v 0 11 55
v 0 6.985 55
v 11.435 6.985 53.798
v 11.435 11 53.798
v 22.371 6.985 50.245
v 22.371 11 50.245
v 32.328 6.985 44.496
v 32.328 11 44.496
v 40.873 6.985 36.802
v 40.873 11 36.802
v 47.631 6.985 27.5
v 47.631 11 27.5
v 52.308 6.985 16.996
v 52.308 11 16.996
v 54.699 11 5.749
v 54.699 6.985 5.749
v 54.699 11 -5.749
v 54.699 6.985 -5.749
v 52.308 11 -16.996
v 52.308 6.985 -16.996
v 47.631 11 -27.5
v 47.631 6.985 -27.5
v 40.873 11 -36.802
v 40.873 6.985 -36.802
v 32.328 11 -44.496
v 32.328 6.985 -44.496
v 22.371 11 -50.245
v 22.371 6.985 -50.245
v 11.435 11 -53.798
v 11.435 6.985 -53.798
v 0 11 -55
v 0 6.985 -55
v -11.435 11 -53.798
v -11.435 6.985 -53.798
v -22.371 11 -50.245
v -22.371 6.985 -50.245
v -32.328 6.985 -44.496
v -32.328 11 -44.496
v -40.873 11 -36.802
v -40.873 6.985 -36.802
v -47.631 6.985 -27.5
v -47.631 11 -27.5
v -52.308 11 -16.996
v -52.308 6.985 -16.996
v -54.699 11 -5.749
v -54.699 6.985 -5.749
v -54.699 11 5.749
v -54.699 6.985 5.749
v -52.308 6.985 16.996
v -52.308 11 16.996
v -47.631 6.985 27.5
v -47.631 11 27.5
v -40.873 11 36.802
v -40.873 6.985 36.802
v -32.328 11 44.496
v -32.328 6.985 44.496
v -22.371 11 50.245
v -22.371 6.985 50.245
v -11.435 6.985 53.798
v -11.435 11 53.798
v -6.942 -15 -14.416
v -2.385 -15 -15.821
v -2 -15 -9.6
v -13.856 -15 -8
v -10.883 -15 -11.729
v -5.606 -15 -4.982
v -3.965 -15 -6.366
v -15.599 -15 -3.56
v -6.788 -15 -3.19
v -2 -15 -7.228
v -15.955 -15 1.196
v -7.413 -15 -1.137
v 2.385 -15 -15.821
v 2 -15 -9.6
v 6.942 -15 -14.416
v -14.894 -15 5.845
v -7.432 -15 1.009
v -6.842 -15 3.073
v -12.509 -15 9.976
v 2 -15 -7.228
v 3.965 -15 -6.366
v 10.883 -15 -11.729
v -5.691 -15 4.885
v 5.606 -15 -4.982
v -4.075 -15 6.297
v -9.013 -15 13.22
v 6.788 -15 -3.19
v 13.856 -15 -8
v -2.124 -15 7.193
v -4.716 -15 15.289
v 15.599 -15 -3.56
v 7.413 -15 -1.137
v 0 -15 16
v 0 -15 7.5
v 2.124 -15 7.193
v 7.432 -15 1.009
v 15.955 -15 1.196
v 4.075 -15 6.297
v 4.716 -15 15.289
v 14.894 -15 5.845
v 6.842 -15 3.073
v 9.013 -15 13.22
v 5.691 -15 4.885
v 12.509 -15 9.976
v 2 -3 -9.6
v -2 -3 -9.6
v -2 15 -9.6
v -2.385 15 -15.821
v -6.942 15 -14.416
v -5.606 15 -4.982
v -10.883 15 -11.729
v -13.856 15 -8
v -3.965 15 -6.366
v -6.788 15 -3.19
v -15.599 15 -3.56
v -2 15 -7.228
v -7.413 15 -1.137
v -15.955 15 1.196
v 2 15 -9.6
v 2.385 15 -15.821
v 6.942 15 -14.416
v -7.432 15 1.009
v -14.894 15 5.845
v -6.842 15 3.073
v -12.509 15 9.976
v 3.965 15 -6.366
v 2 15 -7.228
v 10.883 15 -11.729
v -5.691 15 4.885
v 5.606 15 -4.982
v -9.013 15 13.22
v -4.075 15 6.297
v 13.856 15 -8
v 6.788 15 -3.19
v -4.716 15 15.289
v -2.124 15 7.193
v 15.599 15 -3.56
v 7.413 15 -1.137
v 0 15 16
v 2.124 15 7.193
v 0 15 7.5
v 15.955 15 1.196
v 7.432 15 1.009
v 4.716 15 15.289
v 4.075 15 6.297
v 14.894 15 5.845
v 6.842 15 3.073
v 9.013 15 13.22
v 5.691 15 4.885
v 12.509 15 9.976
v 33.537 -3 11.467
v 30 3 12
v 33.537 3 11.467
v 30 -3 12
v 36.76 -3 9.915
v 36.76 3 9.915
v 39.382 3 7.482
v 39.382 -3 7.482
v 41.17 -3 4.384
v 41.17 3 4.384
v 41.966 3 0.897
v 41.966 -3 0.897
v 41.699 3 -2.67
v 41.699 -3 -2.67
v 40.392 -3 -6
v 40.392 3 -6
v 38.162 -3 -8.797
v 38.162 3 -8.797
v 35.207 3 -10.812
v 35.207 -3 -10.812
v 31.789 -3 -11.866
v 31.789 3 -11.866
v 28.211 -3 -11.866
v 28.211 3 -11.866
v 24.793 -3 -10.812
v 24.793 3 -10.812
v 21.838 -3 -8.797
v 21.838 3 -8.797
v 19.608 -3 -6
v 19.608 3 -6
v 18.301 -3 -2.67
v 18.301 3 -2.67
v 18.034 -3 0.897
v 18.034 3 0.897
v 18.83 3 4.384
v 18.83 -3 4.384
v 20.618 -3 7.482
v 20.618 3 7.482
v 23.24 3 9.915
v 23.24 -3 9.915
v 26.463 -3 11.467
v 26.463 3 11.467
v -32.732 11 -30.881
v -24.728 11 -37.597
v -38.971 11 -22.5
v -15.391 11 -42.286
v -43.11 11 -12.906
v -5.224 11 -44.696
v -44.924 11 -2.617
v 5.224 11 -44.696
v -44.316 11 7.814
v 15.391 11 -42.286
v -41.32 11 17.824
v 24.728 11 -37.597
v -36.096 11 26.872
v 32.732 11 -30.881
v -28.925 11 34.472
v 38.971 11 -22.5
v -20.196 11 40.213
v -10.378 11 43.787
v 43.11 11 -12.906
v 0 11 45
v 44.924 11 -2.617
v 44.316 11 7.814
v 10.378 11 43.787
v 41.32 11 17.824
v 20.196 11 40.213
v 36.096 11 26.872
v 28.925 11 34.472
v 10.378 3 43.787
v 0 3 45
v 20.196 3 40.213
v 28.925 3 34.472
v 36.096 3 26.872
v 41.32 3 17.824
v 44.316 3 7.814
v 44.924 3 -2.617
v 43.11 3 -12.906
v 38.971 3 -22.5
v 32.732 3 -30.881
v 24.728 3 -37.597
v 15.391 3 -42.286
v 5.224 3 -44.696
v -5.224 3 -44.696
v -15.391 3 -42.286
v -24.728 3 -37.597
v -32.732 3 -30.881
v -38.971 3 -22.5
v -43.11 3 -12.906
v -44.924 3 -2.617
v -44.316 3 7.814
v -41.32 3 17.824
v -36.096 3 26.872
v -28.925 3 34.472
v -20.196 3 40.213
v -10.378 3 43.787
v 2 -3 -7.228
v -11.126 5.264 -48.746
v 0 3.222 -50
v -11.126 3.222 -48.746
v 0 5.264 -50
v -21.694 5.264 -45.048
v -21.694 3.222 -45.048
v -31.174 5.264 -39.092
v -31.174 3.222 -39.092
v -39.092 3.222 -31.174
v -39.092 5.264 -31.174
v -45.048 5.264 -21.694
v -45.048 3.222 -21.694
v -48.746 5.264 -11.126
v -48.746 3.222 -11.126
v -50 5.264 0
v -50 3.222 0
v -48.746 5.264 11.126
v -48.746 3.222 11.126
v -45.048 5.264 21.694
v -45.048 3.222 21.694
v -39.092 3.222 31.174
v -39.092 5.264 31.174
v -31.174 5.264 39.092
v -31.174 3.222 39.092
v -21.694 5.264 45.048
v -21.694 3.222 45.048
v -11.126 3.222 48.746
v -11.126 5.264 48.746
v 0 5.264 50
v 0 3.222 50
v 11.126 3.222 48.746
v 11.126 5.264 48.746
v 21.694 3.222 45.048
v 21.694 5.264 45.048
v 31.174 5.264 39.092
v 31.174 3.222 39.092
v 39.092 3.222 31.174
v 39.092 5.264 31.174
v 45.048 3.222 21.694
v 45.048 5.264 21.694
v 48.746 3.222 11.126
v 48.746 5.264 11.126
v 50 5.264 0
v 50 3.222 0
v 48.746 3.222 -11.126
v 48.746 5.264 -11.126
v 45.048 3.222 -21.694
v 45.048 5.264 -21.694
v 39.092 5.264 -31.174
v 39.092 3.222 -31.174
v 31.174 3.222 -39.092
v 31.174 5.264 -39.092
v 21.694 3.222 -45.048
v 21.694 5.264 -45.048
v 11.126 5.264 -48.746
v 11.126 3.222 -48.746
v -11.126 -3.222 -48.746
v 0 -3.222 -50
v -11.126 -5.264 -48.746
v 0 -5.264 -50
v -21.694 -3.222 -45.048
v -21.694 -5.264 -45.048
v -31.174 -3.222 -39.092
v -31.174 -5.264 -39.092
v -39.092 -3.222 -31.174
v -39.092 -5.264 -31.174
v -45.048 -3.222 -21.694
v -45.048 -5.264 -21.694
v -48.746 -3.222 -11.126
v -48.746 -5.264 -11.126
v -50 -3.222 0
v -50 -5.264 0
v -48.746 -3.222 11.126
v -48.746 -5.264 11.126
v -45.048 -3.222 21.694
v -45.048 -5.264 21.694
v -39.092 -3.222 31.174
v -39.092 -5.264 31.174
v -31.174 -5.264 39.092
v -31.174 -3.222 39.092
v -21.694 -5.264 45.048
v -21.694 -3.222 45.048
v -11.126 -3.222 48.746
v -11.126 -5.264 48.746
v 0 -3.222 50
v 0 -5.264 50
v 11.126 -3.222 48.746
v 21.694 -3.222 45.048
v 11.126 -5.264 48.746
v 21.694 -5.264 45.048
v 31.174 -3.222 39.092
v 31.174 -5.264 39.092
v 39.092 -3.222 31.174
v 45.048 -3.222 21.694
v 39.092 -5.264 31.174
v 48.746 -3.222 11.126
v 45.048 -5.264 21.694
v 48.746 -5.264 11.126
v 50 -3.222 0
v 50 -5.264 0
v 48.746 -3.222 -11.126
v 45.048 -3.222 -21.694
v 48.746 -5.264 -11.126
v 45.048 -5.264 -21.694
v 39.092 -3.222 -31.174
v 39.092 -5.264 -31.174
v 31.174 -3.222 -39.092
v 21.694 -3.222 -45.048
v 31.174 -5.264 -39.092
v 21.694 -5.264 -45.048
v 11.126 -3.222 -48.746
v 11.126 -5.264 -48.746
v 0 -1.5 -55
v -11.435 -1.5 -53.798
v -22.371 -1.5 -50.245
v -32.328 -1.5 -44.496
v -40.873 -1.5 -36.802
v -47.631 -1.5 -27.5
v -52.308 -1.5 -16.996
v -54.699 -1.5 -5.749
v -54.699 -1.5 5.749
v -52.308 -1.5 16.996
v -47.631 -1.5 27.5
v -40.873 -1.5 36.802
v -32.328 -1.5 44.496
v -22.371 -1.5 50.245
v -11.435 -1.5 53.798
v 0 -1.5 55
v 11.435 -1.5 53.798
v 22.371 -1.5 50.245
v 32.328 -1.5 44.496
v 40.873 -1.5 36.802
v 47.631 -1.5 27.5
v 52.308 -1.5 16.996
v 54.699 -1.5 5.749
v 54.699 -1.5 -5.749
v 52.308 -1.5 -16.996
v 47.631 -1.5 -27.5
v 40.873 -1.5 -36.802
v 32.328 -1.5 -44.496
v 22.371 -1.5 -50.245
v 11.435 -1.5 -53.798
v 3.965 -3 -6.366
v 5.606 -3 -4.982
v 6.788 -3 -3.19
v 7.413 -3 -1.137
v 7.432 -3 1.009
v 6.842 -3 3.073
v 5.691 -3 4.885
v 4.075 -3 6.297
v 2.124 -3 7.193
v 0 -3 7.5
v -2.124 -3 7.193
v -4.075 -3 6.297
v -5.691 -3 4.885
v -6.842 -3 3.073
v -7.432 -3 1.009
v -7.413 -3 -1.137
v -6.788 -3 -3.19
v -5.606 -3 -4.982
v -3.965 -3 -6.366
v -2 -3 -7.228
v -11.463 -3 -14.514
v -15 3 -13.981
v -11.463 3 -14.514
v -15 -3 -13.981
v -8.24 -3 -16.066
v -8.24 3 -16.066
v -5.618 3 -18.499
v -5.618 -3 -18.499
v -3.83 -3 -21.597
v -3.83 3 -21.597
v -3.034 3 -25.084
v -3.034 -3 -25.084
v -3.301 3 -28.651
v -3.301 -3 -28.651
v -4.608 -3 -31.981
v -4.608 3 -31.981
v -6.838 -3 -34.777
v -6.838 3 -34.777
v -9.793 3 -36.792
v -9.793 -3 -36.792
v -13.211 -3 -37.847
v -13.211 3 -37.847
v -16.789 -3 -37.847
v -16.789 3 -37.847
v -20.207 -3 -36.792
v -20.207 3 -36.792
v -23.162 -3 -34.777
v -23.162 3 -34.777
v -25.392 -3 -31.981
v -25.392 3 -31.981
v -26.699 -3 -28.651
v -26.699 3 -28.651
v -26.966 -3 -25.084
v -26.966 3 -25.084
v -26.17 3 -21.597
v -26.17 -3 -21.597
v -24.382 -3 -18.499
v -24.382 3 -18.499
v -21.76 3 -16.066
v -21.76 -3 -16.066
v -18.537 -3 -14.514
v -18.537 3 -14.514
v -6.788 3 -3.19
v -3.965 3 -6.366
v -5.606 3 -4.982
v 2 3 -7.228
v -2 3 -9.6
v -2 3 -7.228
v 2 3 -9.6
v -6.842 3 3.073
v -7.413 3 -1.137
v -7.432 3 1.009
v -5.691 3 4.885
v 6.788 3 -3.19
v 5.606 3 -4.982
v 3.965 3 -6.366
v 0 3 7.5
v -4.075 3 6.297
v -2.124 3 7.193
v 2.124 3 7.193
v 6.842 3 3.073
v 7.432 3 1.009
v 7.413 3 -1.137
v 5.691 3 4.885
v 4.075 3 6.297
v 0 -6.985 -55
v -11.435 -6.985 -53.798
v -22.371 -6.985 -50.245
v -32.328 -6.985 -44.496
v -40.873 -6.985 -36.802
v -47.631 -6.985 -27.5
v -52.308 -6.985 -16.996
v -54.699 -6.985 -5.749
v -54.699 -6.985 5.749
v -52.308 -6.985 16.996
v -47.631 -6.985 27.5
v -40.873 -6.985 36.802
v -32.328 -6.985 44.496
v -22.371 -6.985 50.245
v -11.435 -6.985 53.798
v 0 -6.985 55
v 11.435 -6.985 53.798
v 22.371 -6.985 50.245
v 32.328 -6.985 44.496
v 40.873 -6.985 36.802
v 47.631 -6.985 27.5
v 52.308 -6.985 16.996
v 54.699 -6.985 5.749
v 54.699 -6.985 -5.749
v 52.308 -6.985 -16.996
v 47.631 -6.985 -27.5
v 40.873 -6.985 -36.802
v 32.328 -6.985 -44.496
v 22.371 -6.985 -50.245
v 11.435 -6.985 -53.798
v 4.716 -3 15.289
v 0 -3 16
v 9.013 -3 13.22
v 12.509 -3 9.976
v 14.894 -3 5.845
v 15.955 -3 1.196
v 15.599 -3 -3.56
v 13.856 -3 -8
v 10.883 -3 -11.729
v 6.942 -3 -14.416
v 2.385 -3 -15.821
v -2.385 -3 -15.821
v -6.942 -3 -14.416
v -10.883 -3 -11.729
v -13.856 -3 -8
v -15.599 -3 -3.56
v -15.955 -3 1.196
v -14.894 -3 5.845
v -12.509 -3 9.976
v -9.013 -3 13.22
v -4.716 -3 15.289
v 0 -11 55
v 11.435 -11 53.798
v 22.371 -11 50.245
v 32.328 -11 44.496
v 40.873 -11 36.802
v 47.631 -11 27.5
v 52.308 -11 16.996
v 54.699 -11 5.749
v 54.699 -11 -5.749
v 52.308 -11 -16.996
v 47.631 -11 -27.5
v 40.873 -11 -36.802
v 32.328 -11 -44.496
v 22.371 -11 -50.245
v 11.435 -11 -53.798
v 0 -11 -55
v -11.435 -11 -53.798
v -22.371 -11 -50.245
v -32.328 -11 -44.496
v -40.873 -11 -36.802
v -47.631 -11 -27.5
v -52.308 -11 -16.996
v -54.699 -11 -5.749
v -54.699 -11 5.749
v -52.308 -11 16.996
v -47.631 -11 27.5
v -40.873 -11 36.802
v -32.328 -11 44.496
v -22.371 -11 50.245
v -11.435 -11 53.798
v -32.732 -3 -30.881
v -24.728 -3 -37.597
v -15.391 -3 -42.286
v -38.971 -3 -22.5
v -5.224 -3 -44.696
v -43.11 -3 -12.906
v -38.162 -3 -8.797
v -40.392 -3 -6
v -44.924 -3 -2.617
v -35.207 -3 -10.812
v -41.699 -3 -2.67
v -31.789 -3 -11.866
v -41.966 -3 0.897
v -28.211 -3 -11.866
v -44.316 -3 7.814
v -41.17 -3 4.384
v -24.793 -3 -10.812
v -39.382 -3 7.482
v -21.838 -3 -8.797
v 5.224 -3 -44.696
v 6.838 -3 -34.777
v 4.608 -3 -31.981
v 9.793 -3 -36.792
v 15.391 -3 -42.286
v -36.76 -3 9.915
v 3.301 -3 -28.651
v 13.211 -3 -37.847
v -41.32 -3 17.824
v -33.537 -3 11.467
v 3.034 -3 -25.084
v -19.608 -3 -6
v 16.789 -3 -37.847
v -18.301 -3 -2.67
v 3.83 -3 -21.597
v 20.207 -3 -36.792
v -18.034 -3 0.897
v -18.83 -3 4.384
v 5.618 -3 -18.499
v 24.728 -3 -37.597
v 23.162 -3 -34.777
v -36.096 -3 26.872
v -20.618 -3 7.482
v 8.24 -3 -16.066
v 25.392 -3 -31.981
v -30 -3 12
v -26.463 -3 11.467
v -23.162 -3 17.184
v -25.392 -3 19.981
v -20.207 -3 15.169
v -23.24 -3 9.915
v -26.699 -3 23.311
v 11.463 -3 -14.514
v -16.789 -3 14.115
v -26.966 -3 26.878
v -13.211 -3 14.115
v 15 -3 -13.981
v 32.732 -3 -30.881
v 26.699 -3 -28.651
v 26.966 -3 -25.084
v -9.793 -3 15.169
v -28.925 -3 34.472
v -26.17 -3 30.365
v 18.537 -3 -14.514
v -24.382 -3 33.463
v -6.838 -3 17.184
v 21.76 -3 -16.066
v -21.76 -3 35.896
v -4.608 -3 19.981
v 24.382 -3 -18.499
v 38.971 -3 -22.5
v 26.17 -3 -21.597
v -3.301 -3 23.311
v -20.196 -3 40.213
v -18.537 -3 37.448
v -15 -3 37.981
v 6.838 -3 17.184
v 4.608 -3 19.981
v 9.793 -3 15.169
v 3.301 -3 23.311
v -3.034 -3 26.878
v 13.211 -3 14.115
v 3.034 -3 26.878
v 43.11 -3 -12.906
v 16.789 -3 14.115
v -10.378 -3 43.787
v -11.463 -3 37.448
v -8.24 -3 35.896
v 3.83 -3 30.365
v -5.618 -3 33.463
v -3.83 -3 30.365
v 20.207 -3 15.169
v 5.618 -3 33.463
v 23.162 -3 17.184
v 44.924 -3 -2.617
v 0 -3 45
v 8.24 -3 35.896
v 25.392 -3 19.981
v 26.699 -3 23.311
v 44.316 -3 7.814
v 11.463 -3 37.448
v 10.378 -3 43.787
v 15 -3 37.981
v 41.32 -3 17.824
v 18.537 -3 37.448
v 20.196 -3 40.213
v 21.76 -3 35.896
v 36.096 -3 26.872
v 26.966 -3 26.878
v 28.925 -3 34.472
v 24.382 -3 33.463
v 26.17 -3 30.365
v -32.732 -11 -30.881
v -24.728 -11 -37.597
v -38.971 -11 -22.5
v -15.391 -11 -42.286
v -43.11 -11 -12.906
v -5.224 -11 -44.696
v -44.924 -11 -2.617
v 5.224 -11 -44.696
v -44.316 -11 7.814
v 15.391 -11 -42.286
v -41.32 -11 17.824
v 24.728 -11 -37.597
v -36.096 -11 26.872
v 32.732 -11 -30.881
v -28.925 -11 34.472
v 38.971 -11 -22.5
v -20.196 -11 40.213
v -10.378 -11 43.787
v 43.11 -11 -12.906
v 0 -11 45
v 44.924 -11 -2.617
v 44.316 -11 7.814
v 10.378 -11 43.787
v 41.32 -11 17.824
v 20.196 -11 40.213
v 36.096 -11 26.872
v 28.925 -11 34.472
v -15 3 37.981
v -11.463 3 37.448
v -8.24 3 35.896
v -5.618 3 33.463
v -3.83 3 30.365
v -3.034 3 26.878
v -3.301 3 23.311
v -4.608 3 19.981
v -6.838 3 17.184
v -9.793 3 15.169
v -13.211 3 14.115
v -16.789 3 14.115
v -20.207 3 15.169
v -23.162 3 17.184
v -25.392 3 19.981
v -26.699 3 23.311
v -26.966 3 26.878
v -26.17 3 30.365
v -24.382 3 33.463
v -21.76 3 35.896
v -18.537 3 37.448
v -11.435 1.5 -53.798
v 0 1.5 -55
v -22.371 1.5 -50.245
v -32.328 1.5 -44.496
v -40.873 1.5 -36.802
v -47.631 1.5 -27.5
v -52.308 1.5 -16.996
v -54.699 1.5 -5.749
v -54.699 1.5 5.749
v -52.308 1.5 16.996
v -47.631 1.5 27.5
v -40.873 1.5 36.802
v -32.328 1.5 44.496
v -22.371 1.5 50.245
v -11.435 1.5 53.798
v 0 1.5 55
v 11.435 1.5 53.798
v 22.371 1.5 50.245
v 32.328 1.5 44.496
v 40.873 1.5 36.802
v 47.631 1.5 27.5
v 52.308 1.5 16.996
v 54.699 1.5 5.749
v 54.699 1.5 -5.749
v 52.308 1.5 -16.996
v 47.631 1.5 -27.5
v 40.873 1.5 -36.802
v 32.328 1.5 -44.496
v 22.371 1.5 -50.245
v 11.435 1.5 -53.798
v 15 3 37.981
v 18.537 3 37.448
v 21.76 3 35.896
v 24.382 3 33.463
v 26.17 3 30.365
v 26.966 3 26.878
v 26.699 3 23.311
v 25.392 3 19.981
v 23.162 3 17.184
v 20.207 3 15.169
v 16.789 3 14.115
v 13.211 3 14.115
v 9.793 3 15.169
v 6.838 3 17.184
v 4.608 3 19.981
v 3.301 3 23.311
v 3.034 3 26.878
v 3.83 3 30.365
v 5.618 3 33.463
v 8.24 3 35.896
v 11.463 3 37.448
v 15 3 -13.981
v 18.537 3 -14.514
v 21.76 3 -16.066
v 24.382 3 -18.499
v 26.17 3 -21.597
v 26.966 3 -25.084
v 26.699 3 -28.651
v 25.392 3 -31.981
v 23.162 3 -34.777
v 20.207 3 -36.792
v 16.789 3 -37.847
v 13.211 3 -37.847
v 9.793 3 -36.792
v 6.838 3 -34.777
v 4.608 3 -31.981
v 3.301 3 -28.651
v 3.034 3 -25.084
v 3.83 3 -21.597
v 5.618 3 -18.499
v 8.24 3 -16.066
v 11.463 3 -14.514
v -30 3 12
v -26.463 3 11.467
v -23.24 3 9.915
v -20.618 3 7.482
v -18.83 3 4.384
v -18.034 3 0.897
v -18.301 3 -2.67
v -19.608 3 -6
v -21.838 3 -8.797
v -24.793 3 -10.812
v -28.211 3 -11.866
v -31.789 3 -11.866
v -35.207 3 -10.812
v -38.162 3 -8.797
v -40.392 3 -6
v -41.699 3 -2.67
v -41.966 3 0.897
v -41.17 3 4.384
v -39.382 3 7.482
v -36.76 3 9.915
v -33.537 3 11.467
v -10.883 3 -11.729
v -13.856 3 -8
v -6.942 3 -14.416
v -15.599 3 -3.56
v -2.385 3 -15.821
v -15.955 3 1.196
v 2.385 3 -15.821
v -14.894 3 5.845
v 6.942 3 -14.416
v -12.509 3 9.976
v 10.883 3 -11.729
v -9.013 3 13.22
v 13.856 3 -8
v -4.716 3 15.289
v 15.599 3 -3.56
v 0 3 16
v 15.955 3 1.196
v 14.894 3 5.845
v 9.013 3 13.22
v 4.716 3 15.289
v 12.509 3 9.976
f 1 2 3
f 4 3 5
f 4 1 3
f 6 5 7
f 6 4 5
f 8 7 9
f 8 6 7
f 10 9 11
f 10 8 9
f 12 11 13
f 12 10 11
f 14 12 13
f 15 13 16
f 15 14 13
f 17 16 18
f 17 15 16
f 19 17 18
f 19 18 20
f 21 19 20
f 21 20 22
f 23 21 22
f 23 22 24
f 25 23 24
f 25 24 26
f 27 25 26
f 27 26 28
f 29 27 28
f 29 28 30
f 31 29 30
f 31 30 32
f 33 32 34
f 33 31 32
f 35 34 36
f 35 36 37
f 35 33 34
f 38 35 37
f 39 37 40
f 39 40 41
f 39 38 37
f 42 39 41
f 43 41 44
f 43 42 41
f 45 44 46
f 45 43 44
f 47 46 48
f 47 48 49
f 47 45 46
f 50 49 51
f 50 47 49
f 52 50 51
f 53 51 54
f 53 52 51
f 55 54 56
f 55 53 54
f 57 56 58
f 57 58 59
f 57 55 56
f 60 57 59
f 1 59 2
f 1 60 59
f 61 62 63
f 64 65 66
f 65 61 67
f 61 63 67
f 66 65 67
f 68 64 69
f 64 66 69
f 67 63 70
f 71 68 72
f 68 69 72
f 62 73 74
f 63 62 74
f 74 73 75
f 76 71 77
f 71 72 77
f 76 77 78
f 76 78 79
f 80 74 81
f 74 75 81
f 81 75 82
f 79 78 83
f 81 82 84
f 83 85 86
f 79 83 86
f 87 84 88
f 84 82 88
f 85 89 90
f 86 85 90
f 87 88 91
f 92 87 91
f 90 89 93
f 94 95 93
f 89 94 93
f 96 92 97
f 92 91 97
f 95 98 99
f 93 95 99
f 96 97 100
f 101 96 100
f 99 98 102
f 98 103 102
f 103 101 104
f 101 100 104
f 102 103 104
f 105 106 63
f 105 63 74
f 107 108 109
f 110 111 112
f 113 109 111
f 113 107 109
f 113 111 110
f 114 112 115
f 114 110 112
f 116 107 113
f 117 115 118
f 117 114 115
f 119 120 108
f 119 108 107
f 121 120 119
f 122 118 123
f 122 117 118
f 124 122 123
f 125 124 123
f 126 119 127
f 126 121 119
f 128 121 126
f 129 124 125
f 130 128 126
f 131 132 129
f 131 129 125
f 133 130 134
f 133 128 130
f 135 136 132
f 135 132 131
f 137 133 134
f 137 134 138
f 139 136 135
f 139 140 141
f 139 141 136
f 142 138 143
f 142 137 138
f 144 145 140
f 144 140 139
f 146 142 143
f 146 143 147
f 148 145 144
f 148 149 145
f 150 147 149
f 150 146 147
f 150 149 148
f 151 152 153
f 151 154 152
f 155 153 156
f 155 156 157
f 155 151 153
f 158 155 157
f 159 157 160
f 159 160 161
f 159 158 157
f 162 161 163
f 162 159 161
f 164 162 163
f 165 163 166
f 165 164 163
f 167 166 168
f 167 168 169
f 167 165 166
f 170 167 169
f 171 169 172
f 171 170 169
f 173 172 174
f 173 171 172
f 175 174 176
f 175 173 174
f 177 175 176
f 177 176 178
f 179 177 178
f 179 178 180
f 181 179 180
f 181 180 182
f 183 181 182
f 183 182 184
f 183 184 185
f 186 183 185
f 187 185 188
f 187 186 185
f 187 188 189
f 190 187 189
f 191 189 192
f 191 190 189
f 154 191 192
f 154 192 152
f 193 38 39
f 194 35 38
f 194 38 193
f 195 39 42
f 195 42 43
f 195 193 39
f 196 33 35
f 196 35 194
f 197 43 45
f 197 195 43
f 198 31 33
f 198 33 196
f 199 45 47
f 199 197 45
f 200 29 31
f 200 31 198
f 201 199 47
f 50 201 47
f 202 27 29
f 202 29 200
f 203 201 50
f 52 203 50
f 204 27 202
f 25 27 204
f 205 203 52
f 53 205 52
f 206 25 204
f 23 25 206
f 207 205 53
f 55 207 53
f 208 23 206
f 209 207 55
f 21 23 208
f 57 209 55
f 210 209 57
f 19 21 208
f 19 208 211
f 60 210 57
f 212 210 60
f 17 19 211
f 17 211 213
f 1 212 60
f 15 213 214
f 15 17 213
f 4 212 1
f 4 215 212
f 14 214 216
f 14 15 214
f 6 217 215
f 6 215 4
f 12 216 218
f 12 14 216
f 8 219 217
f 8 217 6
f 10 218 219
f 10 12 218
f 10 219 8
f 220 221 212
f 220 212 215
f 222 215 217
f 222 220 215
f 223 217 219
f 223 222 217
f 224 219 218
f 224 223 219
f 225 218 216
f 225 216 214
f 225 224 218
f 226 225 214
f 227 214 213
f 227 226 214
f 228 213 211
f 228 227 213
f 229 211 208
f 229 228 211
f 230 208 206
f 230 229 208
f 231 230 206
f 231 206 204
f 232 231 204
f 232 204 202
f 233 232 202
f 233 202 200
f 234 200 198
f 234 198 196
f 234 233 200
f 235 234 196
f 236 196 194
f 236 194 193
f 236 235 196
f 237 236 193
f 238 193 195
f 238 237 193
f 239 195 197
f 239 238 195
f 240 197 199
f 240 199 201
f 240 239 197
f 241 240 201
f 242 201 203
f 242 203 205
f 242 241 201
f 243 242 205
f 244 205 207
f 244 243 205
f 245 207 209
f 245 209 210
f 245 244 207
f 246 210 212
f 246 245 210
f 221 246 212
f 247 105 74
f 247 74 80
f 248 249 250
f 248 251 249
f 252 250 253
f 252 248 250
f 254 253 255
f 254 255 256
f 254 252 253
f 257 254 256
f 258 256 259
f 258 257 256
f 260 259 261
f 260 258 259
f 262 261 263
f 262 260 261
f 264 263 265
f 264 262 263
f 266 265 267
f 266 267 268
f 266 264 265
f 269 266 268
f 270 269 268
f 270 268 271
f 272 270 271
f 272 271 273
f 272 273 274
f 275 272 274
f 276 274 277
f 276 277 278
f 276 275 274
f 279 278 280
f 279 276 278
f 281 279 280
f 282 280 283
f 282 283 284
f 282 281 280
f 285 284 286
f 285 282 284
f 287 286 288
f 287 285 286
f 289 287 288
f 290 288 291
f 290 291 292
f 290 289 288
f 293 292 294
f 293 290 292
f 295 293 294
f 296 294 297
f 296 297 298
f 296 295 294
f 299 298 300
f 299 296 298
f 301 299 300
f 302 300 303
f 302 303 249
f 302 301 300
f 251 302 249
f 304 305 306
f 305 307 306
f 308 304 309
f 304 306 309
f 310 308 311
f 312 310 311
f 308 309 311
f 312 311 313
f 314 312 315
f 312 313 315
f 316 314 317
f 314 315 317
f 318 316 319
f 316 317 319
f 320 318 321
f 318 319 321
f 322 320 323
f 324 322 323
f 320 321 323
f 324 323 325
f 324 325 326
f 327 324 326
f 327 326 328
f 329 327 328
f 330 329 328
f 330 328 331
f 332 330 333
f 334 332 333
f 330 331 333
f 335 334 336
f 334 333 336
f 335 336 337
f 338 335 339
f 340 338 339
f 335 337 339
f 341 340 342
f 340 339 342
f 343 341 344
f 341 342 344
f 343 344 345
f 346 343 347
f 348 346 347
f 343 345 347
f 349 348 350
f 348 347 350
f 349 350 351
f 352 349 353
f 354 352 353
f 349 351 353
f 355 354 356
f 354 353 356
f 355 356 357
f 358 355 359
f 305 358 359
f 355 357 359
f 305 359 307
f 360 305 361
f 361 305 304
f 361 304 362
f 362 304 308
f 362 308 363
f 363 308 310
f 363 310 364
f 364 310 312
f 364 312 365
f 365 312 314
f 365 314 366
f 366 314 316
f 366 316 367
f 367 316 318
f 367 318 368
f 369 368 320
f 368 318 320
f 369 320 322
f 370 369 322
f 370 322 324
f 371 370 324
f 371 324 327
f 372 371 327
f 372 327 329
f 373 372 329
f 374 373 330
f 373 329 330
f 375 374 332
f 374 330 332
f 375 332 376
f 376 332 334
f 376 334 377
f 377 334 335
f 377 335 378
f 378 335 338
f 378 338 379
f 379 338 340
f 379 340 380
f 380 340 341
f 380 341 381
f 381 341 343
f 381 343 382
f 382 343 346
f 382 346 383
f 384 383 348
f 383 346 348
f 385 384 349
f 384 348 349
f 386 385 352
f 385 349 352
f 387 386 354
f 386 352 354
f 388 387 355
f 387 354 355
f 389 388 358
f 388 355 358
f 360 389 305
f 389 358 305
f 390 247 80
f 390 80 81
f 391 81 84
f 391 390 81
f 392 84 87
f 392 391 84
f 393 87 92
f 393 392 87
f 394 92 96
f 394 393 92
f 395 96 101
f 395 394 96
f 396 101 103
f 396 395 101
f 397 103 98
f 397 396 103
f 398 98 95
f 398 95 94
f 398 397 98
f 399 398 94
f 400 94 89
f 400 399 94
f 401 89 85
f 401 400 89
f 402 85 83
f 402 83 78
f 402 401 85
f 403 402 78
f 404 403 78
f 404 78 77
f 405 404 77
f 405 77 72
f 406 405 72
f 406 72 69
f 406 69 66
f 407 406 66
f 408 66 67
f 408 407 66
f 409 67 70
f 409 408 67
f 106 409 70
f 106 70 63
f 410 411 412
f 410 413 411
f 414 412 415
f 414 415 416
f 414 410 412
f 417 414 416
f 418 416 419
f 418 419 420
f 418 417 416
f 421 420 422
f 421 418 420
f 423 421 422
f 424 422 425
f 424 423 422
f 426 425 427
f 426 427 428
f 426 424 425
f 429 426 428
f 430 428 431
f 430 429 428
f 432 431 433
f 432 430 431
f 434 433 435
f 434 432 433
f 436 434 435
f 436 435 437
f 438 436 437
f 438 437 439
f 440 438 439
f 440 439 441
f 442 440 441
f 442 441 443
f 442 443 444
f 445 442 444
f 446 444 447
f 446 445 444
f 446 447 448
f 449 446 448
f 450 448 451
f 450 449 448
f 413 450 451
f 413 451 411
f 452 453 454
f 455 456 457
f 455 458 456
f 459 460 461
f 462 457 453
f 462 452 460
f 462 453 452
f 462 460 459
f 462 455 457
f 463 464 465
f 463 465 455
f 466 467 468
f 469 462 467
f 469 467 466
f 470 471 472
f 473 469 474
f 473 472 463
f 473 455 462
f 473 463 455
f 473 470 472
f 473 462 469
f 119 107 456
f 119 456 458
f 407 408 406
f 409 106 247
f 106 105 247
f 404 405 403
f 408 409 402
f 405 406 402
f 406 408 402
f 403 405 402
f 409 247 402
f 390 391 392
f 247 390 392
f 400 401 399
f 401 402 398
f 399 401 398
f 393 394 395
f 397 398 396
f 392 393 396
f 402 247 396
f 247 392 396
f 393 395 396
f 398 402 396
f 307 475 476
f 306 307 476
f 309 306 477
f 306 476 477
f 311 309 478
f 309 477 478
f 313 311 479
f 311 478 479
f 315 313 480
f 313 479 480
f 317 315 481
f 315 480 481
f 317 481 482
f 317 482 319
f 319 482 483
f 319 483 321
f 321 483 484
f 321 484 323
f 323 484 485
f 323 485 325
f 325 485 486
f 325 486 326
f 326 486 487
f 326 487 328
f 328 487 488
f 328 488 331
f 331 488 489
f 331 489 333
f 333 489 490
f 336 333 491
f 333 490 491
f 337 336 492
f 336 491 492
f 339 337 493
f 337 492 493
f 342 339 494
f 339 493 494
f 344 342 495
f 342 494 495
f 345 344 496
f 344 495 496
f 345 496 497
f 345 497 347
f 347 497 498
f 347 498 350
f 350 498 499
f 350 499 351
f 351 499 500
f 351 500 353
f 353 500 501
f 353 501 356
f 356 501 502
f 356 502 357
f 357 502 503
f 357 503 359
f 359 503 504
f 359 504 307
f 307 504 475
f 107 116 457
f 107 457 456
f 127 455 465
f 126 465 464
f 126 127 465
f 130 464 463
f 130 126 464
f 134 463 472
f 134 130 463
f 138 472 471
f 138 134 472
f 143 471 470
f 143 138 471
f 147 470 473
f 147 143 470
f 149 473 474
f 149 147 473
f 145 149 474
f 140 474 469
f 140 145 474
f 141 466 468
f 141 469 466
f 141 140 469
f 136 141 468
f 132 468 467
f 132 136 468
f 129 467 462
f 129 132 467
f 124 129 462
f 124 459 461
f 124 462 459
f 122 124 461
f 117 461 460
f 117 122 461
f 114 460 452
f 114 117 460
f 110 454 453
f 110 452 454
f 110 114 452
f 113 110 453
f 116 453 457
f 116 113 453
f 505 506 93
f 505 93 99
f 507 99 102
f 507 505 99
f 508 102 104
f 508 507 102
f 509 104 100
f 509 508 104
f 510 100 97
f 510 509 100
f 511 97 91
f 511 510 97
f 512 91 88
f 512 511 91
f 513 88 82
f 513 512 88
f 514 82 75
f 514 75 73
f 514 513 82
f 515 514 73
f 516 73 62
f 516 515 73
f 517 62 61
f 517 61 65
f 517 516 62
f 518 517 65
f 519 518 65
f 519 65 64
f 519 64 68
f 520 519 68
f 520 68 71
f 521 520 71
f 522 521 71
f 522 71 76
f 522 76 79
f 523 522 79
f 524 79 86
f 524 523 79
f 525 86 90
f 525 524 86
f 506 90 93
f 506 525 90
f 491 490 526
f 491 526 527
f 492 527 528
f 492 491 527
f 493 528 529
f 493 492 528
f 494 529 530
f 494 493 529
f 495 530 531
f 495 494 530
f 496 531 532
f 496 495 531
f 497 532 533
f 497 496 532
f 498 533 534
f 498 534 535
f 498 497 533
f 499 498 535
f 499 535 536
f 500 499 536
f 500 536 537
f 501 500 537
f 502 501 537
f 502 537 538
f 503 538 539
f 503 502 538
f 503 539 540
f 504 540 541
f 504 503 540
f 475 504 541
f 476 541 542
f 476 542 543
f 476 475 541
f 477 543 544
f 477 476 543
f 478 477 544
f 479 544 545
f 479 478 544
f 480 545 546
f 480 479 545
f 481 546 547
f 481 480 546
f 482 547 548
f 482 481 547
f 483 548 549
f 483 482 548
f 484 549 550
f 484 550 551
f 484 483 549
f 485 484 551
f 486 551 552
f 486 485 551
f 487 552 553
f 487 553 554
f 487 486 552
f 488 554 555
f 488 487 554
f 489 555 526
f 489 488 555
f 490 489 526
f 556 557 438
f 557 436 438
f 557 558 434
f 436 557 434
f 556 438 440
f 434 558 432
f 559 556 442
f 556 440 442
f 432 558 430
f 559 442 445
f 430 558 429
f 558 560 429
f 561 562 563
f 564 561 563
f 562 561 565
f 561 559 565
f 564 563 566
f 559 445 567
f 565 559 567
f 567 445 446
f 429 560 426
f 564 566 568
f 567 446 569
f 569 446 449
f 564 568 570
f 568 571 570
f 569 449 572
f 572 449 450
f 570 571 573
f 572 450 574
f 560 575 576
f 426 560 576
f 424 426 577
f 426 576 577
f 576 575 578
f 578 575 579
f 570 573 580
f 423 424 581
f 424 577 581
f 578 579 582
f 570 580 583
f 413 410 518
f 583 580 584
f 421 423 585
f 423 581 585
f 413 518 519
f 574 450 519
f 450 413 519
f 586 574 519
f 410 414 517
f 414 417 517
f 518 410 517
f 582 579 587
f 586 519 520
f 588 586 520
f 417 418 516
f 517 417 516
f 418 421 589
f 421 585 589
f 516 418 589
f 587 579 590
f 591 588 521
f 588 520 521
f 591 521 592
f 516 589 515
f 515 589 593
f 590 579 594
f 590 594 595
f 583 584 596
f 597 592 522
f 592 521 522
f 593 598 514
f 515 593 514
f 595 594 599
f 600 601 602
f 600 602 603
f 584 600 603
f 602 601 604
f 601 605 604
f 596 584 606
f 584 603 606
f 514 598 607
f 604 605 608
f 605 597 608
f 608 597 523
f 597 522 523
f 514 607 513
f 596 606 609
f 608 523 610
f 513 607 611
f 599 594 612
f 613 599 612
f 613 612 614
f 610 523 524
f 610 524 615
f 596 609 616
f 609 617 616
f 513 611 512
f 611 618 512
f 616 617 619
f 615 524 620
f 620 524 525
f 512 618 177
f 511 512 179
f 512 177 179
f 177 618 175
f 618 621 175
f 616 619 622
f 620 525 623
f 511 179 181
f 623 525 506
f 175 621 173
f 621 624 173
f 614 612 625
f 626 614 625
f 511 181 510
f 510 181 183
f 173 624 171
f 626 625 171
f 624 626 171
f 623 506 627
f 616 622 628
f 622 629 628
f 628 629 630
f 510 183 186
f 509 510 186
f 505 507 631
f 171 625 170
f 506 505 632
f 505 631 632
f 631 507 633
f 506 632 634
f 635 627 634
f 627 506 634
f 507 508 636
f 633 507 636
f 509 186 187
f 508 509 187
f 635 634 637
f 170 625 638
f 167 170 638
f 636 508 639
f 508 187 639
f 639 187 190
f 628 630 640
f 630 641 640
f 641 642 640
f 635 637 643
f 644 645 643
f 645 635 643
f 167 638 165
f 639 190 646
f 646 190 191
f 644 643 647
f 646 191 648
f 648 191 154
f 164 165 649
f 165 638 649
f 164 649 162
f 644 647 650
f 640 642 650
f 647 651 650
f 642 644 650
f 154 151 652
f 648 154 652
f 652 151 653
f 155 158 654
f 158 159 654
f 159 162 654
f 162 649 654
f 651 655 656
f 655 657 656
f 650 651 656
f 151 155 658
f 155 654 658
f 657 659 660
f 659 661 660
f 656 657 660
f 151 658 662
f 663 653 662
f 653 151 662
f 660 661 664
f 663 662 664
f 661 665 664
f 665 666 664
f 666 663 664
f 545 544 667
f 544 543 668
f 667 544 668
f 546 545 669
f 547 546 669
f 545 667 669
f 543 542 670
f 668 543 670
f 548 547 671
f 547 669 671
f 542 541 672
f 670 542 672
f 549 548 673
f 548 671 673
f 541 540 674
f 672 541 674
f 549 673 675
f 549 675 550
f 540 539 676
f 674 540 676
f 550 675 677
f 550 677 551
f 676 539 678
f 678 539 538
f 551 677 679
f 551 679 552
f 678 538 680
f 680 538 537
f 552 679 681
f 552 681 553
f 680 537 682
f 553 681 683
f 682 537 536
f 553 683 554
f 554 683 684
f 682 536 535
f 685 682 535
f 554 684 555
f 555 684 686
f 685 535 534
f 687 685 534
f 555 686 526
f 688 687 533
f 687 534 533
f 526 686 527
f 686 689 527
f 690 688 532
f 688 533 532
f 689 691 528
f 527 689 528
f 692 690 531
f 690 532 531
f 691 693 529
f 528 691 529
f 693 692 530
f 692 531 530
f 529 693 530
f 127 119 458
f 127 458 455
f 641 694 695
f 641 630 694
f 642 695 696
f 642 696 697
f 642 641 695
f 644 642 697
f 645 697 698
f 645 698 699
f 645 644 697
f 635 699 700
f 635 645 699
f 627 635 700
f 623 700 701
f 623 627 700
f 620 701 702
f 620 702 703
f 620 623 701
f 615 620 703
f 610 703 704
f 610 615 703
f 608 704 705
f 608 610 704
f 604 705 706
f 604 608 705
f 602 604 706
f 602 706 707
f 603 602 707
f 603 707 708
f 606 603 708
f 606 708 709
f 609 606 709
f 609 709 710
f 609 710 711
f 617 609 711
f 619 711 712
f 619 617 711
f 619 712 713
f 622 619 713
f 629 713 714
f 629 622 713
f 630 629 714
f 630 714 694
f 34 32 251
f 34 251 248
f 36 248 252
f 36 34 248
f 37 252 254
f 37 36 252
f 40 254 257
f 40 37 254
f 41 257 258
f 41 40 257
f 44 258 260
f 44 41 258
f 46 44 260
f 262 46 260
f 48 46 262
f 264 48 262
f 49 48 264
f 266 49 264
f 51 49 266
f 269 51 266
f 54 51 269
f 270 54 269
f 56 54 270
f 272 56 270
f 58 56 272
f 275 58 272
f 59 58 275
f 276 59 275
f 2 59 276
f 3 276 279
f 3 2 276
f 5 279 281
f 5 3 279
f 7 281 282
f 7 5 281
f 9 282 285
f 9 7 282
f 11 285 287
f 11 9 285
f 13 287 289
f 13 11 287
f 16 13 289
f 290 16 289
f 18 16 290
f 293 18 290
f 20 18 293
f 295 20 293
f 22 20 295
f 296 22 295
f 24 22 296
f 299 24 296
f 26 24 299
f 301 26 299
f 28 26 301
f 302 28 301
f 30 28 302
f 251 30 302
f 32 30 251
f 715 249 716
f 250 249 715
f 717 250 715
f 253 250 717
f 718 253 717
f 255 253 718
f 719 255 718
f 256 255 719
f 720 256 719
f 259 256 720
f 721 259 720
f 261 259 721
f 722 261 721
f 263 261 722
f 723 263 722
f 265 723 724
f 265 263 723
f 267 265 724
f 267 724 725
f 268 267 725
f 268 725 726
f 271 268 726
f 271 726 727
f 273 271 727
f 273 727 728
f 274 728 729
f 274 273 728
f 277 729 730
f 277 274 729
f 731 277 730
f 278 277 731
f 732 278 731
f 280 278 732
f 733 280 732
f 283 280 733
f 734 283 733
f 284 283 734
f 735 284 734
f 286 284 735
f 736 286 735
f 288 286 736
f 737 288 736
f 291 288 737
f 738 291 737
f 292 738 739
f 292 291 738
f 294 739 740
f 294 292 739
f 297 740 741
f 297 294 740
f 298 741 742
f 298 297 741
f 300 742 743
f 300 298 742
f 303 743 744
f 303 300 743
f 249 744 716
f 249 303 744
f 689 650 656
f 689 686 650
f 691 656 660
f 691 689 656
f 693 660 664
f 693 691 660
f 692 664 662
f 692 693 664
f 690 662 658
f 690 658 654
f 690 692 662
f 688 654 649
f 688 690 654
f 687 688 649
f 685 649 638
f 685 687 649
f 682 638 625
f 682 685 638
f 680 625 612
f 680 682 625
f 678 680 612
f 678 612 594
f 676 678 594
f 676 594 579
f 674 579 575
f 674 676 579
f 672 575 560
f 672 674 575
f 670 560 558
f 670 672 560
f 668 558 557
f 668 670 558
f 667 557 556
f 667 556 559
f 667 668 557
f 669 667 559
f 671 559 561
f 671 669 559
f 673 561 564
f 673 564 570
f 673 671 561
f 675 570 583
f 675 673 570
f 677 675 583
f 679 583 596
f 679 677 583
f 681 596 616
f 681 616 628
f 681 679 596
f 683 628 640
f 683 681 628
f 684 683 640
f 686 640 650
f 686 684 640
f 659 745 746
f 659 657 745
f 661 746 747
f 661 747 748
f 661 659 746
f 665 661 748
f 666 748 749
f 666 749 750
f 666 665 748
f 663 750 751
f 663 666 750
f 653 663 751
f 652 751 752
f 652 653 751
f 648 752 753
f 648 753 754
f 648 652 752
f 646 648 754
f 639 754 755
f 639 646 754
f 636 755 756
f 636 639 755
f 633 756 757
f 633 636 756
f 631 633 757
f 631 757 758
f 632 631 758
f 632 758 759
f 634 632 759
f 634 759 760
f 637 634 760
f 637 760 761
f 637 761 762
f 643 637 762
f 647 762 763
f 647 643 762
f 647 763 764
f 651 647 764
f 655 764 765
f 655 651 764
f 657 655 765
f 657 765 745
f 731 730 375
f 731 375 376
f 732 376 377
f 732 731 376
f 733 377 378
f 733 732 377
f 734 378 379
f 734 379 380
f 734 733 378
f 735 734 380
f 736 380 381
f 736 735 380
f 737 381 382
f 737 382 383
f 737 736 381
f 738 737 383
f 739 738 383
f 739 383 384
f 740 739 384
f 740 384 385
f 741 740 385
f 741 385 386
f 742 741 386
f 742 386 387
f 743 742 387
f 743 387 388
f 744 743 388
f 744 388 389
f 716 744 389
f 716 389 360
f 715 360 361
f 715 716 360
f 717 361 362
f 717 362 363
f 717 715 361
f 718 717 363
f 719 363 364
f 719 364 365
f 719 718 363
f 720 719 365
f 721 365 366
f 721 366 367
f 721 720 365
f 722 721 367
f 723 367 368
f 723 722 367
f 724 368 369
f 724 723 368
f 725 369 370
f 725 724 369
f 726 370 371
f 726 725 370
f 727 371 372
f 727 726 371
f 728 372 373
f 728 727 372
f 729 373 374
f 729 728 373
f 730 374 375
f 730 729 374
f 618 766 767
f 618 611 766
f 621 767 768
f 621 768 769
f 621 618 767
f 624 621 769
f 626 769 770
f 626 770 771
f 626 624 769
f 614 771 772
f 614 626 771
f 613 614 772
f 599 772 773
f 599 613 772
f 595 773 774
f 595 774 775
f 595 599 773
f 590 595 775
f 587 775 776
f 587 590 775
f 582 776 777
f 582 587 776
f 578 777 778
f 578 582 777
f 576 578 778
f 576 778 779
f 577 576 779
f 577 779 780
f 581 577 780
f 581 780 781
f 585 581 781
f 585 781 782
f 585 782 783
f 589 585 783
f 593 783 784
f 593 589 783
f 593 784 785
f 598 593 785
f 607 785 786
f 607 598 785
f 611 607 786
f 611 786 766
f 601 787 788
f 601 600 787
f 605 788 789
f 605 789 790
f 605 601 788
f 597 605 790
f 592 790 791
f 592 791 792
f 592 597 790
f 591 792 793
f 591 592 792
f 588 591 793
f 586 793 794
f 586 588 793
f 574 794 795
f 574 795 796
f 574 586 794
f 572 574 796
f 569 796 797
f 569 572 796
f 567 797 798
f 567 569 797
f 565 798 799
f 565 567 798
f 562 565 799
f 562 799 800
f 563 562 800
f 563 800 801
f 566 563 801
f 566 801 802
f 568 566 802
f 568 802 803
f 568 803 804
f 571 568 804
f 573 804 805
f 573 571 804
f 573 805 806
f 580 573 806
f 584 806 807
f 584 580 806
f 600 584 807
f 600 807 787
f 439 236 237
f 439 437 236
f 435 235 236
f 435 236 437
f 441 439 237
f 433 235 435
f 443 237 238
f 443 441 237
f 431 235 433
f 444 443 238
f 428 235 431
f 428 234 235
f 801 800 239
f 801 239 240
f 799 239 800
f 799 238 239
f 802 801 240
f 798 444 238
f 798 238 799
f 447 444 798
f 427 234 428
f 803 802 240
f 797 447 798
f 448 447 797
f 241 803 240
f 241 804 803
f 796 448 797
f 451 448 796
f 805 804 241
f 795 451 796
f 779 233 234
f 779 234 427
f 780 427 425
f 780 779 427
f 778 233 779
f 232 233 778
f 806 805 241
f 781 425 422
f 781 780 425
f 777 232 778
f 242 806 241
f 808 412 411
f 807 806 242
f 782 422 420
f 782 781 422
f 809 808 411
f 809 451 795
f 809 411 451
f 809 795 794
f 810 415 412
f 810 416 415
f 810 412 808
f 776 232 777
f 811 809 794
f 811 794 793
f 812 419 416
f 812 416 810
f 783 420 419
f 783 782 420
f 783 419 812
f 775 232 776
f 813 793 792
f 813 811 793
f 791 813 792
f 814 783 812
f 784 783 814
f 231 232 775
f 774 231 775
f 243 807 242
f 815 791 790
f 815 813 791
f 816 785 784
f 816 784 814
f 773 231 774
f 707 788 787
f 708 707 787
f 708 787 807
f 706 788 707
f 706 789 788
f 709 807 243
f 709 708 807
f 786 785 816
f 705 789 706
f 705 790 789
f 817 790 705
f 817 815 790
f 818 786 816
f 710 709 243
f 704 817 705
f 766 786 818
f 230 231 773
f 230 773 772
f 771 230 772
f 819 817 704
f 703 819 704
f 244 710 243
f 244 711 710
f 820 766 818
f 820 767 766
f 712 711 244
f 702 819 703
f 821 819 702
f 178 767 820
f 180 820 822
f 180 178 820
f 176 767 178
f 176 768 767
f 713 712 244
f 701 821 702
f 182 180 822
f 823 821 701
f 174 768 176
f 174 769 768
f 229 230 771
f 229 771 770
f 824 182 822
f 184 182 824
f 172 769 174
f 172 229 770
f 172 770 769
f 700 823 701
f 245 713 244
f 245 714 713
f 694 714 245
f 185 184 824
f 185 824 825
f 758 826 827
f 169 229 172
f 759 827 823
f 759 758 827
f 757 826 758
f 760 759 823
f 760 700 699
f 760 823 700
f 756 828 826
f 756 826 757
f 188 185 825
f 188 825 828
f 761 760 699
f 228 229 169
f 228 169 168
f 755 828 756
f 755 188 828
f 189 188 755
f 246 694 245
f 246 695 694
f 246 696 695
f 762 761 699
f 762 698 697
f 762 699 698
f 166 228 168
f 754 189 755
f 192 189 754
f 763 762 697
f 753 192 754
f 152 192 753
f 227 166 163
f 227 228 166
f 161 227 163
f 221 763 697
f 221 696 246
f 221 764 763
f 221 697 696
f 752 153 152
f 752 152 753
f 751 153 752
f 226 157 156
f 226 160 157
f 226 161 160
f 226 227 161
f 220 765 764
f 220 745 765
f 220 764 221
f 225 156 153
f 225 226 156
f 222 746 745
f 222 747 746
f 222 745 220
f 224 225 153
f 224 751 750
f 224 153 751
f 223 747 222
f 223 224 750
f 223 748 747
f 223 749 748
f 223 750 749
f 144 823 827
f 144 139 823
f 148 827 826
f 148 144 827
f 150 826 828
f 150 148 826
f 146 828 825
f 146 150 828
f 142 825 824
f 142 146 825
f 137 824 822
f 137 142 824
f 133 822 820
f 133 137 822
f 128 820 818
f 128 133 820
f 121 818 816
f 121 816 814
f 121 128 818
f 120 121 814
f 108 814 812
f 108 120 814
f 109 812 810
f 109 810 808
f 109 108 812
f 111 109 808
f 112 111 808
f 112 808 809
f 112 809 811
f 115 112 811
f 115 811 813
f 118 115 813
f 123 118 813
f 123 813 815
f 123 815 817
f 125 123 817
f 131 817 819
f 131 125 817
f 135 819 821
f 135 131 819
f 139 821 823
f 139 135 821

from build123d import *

# Parameters (mm, degrees)
SKETCH_1_R      = 16
EXTRUDE_1_DEPTH = 15
SKETCH_2_R      = 45
SKETCH_2_R_2    = 12
EXTRUDE_3_DEPTH = 3
SKETCH_3_R      = 55
SKETCH_3_R_2    = 45
EXTRUDE_4_DEPTH = 11


with BuildPart() as part:
    # 草图1 → 凸台-拉伸1 (new, symmetric)
    with BuildSketch(Plane(origin=(0, 0, 0), x_dir=(1, 0, 0), z_dir=(0, 1, 0))):
        with Locations(Location((0, 0, 0), (0, 0, 270))):
            Circle(SKETCH_1_R)
        with BuildLine():
            ThreePointArc((2, 7.228416147), (0, -7.5), (-2, 7.228416147))
            Line((-2, 7.228416147), (-2, 9.6))
            Line((-2, 9.6), (2, 9.6))
            Line((2, 9.6), (2, 7.228416147))
        make_face(mode=Mode.SUBTRACT)
    extrude(amount=EXTRUDE_1_DEPTH, both=True)

    # 草图2 → 凸台-拉伸3 (add, symmetric)
    with BuildSketch(Plane(origin=(0, 0, 0), x_dir=(1, 0, 0), z_dir=(0, 1, 0))):
        with Locations(Location((0, 0, 0), (0, 0, 270))):
            Circle(SKETCH_2_R)
        with Locations(Location((-30, 0, 0), (0, 0, 270))):
            Circle(SKETCH_2_R_2, mode=Mode.SUBTRACT)
        with Locations(Location((-15, 25.980762114, 0), (0, 0, 270))):
            Circle(SKETCH_2_R_2, mode=Mode.SUBTRACT)
        with Locations(Location((15, 25.980762114, 0), (0, 0, 270))):
            Circle(SKETCH_2_R_2, mode=Mode.SUBTRACT)
        with Locations(Location((30, 0, 0), (0, 0, 270))):
            Circle(SKETCH_2_R_2, mode=Mode.SUBTRACT)
        with Locations(Location((15, -25.980762114, 0), (0, 0, 270))):
            Circle(SKETCH_2_R_2, mode=Mode.SUBTRACT)
        with Locations(Location((-15, -25.980762114, 0), (0, 0, 270))):
            Circle(SKETCH_2_R_2, mode=Mode.SUBTRACT)
    extrude(amount=EXTRUDE_3_DEPTH, both=True)

    # 草图3 → 凸台-拉伸4 (add, symmetric)
    with BuildSketch(Plane(origin=(0, 0, 0), x_dir=(1, 0, 0), z_dir=(0, 1, 0))):
        with Locations(Location((0, 0, 0), (0, 0, 270))):
            Circle(SKETCH_3_R)
        with Locations(Location((0, 0, 0), (0, 0, 270))):
            Circle(SKETCH_3_R_2, mode=Mode.SUBTRACT)
    extrude(amount=EXTRUDE_4_DEPTH, both=True)

    # 草图4 → 切除-旋转1 (revolve, cut)
    with BuildSketch(Plane.XY, mode=Mode.PRIVATE) as cut_revolve_1_sk:
        Polygon((-55, 1.5), (-50, 3.221638066), (-50, 5.263530397), (-55, 6.985168464), align=None)
        Polygon((-55, -1.5), (-50, -3.221638066), (-50, -5.263530397), (-55, -6.985168464), align=None)
    revolve(cut_revolve_1_sk.sketch.rotate(Axis((0, -16.5, 0), (0, 1, 0)), 270), axis=Axis((0, -16.5, 0), (0, 1, 0)), mode=Mode.SUBTRACT)


solid = part.part
